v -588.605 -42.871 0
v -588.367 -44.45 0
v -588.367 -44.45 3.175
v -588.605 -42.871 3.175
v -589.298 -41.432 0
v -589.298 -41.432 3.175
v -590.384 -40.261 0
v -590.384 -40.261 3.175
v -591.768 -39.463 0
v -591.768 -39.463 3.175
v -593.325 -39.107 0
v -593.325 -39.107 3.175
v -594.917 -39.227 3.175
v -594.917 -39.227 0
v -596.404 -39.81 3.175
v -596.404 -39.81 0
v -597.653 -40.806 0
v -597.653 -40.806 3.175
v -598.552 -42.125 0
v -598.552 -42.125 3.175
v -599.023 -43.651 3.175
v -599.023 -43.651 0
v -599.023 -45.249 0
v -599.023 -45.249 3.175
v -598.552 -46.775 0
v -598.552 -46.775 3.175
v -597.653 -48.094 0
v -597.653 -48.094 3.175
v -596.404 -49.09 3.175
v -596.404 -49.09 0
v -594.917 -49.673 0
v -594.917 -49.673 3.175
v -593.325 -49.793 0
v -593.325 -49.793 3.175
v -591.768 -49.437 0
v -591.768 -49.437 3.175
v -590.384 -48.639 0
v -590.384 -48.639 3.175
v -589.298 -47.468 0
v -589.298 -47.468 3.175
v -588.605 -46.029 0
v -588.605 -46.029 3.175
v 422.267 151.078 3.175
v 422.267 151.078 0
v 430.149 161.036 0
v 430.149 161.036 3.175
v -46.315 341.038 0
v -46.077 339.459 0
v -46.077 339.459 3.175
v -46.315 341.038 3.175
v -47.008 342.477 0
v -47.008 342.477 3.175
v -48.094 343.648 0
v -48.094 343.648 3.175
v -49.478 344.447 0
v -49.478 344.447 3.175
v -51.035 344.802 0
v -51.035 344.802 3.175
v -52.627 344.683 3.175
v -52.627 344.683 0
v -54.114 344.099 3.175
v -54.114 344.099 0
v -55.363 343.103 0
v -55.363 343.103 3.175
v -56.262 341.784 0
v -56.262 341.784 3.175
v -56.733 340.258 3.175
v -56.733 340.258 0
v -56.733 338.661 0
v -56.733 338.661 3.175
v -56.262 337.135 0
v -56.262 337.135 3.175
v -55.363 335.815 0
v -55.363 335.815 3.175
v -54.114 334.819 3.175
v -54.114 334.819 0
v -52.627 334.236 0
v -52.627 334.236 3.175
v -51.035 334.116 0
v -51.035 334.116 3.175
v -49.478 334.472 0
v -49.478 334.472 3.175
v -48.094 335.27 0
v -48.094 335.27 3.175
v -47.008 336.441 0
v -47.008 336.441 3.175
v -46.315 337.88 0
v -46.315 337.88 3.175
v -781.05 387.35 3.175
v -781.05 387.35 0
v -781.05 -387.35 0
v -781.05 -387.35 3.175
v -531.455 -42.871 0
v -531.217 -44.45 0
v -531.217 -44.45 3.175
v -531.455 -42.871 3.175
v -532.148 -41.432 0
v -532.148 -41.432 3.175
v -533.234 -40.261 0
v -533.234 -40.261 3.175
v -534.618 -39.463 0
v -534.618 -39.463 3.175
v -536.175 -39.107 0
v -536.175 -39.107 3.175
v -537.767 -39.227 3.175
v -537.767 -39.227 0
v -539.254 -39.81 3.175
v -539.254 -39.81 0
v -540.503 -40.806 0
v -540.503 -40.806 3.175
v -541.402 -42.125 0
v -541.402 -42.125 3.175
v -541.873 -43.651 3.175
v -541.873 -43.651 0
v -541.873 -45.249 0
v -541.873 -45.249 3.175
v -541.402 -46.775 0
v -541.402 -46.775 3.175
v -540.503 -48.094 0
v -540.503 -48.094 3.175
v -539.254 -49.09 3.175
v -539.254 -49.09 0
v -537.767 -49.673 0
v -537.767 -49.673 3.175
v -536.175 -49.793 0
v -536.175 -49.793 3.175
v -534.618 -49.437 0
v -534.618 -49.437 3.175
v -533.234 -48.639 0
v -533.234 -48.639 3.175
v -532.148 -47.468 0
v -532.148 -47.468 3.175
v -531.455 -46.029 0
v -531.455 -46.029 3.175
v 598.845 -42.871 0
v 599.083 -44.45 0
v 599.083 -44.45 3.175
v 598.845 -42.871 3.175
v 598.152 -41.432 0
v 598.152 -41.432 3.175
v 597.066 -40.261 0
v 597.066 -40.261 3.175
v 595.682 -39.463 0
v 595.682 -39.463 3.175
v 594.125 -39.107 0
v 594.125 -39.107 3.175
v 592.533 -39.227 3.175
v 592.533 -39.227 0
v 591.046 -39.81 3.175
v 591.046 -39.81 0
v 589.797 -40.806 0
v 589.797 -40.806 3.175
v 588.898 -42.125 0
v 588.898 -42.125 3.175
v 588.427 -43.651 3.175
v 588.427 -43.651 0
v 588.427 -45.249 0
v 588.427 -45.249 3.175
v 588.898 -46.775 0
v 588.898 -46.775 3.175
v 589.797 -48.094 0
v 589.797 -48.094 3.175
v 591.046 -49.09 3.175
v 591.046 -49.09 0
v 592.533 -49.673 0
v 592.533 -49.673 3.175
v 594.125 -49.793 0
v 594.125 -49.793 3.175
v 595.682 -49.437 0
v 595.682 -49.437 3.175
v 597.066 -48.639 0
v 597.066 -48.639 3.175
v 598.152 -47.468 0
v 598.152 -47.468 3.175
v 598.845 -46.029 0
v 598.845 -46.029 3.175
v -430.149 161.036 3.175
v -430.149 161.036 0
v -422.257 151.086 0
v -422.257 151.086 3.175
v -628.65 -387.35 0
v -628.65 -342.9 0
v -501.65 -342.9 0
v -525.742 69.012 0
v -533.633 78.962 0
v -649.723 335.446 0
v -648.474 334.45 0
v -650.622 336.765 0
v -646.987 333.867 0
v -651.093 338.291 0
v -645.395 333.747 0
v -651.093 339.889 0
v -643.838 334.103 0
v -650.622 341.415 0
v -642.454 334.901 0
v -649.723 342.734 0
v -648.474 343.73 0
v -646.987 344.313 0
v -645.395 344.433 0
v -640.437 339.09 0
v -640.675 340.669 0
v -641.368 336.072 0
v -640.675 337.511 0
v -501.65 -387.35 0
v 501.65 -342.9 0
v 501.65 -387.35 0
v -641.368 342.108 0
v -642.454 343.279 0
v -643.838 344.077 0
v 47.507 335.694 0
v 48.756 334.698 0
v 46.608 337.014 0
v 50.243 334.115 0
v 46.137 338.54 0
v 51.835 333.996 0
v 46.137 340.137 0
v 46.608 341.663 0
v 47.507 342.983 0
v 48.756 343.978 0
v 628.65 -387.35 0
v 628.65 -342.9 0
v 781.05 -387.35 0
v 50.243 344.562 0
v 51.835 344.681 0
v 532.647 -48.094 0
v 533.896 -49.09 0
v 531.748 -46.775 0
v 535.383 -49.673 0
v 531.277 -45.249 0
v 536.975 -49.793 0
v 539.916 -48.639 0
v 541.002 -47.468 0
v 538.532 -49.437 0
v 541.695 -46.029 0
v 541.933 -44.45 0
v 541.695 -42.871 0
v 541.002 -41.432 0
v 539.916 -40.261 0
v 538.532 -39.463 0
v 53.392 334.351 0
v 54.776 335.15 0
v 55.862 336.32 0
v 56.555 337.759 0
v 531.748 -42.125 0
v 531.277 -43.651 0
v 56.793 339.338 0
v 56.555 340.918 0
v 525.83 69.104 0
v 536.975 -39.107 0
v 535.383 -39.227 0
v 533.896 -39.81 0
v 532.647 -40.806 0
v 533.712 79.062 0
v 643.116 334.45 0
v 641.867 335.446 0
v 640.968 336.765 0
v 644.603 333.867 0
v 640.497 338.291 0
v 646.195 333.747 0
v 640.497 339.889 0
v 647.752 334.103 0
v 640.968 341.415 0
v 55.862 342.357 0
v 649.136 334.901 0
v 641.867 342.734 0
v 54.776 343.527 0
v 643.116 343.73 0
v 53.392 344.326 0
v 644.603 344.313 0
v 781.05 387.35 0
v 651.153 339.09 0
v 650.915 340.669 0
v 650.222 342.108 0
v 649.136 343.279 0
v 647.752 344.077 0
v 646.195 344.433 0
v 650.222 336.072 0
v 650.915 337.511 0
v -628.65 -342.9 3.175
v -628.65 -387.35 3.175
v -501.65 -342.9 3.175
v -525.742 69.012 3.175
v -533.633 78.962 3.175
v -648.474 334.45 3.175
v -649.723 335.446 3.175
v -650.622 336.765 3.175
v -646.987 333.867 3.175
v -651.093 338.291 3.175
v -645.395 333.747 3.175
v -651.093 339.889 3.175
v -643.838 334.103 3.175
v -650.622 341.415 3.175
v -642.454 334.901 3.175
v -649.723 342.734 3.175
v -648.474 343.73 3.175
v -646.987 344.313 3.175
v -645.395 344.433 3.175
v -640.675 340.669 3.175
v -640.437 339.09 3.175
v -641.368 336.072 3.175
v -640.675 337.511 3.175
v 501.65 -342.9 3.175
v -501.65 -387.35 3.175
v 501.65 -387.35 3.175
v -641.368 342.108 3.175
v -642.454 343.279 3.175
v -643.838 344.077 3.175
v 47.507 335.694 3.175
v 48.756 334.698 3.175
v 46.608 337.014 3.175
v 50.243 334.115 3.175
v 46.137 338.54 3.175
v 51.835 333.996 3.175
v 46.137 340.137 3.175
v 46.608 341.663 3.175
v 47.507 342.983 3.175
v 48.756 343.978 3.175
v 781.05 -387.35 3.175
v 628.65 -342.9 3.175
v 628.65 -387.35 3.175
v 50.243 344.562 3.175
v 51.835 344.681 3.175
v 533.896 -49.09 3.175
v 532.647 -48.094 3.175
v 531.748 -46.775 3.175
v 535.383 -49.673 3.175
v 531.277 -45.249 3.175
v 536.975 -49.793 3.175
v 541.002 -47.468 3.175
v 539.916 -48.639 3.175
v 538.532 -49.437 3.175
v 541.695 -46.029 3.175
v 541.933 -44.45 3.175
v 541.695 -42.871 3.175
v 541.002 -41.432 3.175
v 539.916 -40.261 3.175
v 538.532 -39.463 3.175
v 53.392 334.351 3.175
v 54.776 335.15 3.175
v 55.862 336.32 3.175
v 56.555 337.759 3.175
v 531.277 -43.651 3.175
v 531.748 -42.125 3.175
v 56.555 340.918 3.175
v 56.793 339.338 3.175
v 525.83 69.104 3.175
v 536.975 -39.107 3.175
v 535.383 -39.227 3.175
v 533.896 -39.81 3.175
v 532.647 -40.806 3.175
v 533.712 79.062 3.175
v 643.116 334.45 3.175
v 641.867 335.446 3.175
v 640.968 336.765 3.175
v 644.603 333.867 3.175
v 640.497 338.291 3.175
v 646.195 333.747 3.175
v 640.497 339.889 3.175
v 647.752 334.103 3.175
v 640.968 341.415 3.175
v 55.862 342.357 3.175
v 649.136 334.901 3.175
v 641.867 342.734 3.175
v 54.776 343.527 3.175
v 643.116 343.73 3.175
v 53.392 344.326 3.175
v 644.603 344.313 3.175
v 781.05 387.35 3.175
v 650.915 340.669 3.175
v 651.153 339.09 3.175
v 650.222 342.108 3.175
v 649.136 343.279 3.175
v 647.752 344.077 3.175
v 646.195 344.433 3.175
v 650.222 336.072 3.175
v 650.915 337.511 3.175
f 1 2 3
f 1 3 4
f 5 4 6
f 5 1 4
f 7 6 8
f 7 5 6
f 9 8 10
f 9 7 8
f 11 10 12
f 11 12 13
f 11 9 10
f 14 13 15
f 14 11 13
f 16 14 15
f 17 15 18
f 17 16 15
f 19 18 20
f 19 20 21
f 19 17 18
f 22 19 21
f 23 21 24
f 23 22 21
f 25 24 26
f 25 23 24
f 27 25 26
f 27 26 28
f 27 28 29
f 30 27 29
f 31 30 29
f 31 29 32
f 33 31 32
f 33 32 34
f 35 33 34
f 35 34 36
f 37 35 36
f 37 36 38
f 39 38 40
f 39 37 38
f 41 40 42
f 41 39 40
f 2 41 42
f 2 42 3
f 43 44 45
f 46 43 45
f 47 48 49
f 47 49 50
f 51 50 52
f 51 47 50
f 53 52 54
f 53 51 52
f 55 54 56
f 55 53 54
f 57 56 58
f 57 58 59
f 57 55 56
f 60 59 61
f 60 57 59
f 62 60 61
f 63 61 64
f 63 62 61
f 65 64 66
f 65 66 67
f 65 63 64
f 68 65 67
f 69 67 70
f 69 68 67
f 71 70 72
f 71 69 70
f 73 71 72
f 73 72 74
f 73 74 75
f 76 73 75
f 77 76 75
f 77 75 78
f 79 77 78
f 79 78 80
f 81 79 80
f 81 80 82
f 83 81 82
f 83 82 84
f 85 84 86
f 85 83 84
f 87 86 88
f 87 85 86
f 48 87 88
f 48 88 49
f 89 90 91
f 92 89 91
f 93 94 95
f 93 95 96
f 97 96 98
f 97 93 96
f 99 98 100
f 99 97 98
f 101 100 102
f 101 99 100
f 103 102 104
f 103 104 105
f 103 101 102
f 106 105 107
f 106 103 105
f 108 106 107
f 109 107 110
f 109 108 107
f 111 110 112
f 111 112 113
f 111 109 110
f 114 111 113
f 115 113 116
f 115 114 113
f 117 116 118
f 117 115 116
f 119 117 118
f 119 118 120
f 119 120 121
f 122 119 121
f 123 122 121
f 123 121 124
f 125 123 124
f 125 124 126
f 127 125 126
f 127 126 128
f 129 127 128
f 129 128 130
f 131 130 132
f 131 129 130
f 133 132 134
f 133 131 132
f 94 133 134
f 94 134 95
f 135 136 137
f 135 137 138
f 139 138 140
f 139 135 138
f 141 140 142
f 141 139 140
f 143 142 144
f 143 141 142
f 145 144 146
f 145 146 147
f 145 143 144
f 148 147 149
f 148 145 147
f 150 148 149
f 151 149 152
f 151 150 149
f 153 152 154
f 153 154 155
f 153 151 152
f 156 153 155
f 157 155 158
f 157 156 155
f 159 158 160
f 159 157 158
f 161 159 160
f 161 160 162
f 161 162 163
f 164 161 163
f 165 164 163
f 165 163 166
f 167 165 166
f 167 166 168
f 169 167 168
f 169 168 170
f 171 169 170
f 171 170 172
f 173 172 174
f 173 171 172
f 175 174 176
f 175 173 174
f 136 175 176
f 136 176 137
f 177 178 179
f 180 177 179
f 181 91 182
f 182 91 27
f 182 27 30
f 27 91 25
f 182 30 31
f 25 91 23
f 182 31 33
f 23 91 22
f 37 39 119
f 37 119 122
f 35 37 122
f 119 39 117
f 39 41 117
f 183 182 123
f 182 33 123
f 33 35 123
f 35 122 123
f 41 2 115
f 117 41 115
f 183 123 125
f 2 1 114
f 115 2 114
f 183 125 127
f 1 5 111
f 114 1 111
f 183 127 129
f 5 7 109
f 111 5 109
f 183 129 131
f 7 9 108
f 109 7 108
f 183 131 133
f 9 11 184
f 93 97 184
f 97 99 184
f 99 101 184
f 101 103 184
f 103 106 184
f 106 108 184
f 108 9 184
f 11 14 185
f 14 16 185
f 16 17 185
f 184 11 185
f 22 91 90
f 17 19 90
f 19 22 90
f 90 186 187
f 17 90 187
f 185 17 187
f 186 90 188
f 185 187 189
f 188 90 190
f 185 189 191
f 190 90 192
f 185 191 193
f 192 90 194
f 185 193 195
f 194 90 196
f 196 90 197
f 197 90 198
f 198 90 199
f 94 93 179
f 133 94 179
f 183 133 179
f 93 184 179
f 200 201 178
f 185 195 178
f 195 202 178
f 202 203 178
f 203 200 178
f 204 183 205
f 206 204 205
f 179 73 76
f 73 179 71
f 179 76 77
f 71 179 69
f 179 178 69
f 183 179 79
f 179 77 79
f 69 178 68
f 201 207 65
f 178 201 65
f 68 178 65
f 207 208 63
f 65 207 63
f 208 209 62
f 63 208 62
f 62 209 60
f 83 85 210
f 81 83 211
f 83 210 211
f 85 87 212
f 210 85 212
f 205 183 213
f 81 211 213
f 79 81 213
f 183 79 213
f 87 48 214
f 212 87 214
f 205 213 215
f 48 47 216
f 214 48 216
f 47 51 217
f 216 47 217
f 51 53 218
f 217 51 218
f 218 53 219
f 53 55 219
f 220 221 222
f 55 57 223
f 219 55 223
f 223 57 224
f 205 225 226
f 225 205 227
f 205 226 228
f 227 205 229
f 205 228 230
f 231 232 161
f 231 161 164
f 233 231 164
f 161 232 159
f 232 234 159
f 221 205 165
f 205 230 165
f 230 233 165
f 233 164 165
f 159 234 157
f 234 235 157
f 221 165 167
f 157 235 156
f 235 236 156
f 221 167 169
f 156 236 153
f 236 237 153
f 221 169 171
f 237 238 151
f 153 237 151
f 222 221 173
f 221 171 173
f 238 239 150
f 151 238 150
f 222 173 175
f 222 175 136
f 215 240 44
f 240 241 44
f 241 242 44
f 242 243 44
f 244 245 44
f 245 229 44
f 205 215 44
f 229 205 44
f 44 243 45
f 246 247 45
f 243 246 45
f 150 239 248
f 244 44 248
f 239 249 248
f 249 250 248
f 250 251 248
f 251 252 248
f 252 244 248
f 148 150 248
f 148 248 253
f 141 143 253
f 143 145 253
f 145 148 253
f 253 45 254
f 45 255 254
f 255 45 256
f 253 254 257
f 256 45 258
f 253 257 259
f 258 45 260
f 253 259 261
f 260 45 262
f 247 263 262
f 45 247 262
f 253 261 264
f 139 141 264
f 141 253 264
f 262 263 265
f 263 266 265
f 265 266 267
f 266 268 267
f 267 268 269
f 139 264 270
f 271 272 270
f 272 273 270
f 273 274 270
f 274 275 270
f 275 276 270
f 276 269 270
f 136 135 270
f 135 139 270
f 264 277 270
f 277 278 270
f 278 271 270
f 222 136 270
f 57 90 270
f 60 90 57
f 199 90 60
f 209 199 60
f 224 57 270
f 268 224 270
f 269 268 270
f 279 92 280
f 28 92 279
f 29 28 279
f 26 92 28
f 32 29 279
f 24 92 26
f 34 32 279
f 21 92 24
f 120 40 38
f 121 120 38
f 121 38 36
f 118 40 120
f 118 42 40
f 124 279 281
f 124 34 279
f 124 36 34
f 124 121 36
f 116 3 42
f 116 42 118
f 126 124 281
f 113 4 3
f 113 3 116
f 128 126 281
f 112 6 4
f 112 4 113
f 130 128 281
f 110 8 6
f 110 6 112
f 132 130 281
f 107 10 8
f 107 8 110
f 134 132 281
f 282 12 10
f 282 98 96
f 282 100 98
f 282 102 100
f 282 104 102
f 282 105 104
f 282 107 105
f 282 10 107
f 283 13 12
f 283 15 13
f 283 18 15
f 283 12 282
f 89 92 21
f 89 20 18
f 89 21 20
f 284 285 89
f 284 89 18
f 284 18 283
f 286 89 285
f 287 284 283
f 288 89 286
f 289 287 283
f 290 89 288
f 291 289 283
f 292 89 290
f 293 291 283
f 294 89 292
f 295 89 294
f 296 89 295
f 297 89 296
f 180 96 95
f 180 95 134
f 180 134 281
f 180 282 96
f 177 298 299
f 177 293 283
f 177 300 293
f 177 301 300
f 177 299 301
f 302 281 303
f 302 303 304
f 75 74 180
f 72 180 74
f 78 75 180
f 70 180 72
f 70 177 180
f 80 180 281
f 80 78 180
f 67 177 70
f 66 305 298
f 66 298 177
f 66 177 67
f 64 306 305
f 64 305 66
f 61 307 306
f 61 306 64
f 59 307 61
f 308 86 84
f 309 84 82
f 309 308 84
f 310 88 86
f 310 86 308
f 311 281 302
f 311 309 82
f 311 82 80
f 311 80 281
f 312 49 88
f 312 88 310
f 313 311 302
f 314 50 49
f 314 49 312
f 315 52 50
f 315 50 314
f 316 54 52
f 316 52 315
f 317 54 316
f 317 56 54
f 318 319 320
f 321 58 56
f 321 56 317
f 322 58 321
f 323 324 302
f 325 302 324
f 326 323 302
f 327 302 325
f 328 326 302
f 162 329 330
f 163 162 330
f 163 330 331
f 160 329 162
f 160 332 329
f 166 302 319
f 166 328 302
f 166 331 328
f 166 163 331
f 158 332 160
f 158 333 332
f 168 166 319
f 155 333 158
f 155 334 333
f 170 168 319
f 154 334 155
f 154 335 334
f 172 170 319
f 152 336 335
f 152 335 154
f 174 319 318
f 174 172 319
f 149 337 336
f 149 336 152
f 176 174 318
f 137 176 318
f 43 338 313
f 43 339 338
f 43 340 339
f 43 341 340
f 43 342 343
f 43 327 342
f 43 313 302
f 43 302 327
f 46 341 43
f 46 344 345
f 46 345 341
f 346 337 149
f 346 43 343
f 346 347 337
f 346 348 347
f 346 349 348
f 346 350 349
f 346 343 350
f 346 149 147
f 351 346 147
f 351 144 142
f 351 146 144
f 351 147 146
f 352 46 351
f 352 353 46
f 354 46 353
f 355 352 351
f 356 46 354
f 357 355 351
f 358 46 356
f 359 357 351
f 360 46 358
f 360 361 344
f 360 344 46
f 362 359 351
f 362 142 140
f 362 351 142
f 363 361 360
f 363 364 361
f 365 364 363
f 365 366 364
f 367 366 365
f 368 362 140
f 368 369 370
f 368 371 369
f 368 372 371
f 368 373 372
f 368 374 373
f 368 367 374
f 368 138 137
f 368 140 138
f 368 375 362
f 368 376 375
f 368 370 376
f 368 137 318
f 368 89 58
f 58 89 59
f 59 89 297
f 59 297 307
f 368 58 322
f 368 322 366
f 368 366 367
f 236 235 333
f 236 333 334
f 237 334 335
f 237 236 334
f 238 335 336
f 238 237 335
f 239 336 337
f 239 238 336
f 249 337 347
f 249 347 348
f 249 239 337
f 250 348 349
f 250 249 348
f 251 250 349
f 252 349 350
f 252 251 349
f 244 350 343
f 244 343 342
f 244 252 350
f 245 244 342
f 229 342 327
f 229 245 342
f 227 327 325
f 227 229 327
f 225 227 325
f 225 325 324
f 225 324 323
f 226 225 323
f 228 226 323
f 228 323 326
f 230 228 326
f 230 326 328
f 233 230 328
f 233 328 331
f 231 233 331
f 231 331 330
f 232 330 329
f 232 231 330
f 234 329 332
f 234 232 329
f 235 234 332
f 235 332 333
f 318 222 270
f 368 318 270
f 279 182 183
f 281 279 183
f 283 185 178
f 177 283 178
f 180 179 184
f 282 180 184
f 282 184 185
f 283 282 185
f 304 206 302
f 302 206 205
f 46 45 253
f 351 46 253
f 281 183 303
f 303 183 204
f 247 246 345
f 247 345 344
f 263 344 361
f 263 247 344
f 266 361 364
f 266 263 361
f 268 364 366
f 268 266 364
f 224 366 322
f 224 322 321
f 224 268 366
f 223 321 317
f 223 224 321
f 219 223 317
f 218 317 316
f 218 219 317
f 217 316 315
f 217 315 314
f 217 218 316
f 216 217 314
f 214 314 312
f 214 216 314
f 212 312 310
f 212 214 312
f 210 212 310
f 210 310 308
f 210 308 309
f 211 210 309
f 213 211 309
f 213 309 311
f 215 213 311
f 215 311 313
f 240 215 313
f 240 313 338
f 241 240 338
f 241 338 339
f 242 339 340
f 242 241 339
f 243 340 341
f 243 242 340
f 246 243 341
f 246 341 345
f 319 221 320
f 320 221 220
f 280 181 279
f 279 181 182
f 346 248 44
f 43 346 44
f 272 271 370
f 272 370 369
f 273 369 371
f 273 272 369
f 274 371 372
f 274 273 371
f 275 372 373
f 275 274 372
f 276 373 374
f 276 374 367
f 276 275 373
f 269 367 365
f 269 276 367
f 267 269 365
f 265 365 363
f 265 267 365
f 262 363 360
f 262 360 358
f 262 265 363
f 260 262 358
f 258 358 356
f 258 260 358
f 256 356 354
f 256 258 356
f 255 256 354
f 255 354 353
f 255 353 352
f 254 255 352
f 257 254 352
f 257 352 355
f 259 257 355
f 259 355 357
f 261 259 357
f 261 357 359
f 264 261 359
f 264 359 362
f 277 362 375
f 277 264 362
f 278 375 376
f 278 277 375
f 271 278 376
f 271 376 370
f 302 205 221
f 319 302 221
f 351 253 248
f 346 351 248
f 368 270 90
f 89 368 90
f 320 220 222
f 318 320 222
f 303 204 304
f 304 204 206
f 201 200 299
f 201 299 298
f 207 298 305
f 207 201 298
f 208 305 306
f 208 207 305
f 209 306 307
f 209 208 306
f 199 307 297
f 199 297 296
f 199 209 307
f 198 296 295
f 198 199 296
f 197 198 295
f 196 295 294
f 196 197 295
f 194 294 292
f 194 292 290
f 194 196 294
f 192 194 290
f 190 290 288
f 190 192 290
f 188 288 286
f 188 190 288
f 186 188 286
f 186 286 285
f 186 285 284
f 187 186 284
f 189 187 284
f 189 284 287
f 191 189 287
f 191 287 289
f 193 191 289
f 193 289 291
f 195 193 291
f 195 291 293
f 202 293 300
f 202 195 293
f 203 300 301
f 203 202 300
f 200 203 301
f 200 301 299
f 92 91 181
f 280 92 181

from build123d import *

# Parameters (mm, degrees)
SKETCH1_R           = 5.3578125
BOSS_EXTRUDE1_DEPTH = 3.175


with BuildPart() as part:
    # Sketch1 → Boss-Extrude1 (new body)
    with BuildSketch(Plane.XY):
        Polygon((781.05, 387.35), (-781.05, 387.35), (-781.05, -387.35), (-628.65, -387.35), (-628.65, -342.9), (-501.65, -342.9), (-501.65, -387.35), (501.65, -387.35), (501.65, -342.9), (628.65, -342.9), (628.65, -387.35), (781.05, -387.35), align=None)
        with Locations((-593.725, -44.45)):
            Circle(SKETCH1_R, mode=Mode.SUBTRACT)
        with Locations((-536.575, -44.45)):
            Circle(SKETCH1_R, mode=Mode.SUBTRACT)
        with Locations((536.575, -44.45)):
            Circle(SKETCH1_R, mode=Mode.SUBTRACT)
        with Locations((593.725, -44.45)):
            Circle(SKETCH1_R, mode=Mode.SUBTRACT)
        Polygon((-525.741660624, 69.011766046), (-533.633373454, 78.962186571), (-430.149, 161.036), (-422.25728717, 151.085579476), align=None, mode=Mode.SUBTRACT)
        with Locations((-645.795, 339.09)):
            Circle(SKETCH1_R, mode=Mode.SUBTRACT)
        with Locations((-51.435, 339.459169182)):
            Circle(SKETCH1_R, mode=Mode.SUBTRACT)
        Polygon((533.712268362, 79.061761082), (525.830130005, 69.103754509), (422.266861643, 151.077993427), (430.149, 161.036), align=None, mode=Mode.SUBTRACT)
        with Locations((51.435, 339.338450694)):
            Circle(SKETCH1_R, mode=Mode.SUBTRACT)
        with Locations((645.795, 339.09)):
            Circle(SKETCH1_R, mode=Mode.SUBTRACT)
    extrude(amount=BOSS_EXTRUDE1_DEPTH)


solid = part.part
